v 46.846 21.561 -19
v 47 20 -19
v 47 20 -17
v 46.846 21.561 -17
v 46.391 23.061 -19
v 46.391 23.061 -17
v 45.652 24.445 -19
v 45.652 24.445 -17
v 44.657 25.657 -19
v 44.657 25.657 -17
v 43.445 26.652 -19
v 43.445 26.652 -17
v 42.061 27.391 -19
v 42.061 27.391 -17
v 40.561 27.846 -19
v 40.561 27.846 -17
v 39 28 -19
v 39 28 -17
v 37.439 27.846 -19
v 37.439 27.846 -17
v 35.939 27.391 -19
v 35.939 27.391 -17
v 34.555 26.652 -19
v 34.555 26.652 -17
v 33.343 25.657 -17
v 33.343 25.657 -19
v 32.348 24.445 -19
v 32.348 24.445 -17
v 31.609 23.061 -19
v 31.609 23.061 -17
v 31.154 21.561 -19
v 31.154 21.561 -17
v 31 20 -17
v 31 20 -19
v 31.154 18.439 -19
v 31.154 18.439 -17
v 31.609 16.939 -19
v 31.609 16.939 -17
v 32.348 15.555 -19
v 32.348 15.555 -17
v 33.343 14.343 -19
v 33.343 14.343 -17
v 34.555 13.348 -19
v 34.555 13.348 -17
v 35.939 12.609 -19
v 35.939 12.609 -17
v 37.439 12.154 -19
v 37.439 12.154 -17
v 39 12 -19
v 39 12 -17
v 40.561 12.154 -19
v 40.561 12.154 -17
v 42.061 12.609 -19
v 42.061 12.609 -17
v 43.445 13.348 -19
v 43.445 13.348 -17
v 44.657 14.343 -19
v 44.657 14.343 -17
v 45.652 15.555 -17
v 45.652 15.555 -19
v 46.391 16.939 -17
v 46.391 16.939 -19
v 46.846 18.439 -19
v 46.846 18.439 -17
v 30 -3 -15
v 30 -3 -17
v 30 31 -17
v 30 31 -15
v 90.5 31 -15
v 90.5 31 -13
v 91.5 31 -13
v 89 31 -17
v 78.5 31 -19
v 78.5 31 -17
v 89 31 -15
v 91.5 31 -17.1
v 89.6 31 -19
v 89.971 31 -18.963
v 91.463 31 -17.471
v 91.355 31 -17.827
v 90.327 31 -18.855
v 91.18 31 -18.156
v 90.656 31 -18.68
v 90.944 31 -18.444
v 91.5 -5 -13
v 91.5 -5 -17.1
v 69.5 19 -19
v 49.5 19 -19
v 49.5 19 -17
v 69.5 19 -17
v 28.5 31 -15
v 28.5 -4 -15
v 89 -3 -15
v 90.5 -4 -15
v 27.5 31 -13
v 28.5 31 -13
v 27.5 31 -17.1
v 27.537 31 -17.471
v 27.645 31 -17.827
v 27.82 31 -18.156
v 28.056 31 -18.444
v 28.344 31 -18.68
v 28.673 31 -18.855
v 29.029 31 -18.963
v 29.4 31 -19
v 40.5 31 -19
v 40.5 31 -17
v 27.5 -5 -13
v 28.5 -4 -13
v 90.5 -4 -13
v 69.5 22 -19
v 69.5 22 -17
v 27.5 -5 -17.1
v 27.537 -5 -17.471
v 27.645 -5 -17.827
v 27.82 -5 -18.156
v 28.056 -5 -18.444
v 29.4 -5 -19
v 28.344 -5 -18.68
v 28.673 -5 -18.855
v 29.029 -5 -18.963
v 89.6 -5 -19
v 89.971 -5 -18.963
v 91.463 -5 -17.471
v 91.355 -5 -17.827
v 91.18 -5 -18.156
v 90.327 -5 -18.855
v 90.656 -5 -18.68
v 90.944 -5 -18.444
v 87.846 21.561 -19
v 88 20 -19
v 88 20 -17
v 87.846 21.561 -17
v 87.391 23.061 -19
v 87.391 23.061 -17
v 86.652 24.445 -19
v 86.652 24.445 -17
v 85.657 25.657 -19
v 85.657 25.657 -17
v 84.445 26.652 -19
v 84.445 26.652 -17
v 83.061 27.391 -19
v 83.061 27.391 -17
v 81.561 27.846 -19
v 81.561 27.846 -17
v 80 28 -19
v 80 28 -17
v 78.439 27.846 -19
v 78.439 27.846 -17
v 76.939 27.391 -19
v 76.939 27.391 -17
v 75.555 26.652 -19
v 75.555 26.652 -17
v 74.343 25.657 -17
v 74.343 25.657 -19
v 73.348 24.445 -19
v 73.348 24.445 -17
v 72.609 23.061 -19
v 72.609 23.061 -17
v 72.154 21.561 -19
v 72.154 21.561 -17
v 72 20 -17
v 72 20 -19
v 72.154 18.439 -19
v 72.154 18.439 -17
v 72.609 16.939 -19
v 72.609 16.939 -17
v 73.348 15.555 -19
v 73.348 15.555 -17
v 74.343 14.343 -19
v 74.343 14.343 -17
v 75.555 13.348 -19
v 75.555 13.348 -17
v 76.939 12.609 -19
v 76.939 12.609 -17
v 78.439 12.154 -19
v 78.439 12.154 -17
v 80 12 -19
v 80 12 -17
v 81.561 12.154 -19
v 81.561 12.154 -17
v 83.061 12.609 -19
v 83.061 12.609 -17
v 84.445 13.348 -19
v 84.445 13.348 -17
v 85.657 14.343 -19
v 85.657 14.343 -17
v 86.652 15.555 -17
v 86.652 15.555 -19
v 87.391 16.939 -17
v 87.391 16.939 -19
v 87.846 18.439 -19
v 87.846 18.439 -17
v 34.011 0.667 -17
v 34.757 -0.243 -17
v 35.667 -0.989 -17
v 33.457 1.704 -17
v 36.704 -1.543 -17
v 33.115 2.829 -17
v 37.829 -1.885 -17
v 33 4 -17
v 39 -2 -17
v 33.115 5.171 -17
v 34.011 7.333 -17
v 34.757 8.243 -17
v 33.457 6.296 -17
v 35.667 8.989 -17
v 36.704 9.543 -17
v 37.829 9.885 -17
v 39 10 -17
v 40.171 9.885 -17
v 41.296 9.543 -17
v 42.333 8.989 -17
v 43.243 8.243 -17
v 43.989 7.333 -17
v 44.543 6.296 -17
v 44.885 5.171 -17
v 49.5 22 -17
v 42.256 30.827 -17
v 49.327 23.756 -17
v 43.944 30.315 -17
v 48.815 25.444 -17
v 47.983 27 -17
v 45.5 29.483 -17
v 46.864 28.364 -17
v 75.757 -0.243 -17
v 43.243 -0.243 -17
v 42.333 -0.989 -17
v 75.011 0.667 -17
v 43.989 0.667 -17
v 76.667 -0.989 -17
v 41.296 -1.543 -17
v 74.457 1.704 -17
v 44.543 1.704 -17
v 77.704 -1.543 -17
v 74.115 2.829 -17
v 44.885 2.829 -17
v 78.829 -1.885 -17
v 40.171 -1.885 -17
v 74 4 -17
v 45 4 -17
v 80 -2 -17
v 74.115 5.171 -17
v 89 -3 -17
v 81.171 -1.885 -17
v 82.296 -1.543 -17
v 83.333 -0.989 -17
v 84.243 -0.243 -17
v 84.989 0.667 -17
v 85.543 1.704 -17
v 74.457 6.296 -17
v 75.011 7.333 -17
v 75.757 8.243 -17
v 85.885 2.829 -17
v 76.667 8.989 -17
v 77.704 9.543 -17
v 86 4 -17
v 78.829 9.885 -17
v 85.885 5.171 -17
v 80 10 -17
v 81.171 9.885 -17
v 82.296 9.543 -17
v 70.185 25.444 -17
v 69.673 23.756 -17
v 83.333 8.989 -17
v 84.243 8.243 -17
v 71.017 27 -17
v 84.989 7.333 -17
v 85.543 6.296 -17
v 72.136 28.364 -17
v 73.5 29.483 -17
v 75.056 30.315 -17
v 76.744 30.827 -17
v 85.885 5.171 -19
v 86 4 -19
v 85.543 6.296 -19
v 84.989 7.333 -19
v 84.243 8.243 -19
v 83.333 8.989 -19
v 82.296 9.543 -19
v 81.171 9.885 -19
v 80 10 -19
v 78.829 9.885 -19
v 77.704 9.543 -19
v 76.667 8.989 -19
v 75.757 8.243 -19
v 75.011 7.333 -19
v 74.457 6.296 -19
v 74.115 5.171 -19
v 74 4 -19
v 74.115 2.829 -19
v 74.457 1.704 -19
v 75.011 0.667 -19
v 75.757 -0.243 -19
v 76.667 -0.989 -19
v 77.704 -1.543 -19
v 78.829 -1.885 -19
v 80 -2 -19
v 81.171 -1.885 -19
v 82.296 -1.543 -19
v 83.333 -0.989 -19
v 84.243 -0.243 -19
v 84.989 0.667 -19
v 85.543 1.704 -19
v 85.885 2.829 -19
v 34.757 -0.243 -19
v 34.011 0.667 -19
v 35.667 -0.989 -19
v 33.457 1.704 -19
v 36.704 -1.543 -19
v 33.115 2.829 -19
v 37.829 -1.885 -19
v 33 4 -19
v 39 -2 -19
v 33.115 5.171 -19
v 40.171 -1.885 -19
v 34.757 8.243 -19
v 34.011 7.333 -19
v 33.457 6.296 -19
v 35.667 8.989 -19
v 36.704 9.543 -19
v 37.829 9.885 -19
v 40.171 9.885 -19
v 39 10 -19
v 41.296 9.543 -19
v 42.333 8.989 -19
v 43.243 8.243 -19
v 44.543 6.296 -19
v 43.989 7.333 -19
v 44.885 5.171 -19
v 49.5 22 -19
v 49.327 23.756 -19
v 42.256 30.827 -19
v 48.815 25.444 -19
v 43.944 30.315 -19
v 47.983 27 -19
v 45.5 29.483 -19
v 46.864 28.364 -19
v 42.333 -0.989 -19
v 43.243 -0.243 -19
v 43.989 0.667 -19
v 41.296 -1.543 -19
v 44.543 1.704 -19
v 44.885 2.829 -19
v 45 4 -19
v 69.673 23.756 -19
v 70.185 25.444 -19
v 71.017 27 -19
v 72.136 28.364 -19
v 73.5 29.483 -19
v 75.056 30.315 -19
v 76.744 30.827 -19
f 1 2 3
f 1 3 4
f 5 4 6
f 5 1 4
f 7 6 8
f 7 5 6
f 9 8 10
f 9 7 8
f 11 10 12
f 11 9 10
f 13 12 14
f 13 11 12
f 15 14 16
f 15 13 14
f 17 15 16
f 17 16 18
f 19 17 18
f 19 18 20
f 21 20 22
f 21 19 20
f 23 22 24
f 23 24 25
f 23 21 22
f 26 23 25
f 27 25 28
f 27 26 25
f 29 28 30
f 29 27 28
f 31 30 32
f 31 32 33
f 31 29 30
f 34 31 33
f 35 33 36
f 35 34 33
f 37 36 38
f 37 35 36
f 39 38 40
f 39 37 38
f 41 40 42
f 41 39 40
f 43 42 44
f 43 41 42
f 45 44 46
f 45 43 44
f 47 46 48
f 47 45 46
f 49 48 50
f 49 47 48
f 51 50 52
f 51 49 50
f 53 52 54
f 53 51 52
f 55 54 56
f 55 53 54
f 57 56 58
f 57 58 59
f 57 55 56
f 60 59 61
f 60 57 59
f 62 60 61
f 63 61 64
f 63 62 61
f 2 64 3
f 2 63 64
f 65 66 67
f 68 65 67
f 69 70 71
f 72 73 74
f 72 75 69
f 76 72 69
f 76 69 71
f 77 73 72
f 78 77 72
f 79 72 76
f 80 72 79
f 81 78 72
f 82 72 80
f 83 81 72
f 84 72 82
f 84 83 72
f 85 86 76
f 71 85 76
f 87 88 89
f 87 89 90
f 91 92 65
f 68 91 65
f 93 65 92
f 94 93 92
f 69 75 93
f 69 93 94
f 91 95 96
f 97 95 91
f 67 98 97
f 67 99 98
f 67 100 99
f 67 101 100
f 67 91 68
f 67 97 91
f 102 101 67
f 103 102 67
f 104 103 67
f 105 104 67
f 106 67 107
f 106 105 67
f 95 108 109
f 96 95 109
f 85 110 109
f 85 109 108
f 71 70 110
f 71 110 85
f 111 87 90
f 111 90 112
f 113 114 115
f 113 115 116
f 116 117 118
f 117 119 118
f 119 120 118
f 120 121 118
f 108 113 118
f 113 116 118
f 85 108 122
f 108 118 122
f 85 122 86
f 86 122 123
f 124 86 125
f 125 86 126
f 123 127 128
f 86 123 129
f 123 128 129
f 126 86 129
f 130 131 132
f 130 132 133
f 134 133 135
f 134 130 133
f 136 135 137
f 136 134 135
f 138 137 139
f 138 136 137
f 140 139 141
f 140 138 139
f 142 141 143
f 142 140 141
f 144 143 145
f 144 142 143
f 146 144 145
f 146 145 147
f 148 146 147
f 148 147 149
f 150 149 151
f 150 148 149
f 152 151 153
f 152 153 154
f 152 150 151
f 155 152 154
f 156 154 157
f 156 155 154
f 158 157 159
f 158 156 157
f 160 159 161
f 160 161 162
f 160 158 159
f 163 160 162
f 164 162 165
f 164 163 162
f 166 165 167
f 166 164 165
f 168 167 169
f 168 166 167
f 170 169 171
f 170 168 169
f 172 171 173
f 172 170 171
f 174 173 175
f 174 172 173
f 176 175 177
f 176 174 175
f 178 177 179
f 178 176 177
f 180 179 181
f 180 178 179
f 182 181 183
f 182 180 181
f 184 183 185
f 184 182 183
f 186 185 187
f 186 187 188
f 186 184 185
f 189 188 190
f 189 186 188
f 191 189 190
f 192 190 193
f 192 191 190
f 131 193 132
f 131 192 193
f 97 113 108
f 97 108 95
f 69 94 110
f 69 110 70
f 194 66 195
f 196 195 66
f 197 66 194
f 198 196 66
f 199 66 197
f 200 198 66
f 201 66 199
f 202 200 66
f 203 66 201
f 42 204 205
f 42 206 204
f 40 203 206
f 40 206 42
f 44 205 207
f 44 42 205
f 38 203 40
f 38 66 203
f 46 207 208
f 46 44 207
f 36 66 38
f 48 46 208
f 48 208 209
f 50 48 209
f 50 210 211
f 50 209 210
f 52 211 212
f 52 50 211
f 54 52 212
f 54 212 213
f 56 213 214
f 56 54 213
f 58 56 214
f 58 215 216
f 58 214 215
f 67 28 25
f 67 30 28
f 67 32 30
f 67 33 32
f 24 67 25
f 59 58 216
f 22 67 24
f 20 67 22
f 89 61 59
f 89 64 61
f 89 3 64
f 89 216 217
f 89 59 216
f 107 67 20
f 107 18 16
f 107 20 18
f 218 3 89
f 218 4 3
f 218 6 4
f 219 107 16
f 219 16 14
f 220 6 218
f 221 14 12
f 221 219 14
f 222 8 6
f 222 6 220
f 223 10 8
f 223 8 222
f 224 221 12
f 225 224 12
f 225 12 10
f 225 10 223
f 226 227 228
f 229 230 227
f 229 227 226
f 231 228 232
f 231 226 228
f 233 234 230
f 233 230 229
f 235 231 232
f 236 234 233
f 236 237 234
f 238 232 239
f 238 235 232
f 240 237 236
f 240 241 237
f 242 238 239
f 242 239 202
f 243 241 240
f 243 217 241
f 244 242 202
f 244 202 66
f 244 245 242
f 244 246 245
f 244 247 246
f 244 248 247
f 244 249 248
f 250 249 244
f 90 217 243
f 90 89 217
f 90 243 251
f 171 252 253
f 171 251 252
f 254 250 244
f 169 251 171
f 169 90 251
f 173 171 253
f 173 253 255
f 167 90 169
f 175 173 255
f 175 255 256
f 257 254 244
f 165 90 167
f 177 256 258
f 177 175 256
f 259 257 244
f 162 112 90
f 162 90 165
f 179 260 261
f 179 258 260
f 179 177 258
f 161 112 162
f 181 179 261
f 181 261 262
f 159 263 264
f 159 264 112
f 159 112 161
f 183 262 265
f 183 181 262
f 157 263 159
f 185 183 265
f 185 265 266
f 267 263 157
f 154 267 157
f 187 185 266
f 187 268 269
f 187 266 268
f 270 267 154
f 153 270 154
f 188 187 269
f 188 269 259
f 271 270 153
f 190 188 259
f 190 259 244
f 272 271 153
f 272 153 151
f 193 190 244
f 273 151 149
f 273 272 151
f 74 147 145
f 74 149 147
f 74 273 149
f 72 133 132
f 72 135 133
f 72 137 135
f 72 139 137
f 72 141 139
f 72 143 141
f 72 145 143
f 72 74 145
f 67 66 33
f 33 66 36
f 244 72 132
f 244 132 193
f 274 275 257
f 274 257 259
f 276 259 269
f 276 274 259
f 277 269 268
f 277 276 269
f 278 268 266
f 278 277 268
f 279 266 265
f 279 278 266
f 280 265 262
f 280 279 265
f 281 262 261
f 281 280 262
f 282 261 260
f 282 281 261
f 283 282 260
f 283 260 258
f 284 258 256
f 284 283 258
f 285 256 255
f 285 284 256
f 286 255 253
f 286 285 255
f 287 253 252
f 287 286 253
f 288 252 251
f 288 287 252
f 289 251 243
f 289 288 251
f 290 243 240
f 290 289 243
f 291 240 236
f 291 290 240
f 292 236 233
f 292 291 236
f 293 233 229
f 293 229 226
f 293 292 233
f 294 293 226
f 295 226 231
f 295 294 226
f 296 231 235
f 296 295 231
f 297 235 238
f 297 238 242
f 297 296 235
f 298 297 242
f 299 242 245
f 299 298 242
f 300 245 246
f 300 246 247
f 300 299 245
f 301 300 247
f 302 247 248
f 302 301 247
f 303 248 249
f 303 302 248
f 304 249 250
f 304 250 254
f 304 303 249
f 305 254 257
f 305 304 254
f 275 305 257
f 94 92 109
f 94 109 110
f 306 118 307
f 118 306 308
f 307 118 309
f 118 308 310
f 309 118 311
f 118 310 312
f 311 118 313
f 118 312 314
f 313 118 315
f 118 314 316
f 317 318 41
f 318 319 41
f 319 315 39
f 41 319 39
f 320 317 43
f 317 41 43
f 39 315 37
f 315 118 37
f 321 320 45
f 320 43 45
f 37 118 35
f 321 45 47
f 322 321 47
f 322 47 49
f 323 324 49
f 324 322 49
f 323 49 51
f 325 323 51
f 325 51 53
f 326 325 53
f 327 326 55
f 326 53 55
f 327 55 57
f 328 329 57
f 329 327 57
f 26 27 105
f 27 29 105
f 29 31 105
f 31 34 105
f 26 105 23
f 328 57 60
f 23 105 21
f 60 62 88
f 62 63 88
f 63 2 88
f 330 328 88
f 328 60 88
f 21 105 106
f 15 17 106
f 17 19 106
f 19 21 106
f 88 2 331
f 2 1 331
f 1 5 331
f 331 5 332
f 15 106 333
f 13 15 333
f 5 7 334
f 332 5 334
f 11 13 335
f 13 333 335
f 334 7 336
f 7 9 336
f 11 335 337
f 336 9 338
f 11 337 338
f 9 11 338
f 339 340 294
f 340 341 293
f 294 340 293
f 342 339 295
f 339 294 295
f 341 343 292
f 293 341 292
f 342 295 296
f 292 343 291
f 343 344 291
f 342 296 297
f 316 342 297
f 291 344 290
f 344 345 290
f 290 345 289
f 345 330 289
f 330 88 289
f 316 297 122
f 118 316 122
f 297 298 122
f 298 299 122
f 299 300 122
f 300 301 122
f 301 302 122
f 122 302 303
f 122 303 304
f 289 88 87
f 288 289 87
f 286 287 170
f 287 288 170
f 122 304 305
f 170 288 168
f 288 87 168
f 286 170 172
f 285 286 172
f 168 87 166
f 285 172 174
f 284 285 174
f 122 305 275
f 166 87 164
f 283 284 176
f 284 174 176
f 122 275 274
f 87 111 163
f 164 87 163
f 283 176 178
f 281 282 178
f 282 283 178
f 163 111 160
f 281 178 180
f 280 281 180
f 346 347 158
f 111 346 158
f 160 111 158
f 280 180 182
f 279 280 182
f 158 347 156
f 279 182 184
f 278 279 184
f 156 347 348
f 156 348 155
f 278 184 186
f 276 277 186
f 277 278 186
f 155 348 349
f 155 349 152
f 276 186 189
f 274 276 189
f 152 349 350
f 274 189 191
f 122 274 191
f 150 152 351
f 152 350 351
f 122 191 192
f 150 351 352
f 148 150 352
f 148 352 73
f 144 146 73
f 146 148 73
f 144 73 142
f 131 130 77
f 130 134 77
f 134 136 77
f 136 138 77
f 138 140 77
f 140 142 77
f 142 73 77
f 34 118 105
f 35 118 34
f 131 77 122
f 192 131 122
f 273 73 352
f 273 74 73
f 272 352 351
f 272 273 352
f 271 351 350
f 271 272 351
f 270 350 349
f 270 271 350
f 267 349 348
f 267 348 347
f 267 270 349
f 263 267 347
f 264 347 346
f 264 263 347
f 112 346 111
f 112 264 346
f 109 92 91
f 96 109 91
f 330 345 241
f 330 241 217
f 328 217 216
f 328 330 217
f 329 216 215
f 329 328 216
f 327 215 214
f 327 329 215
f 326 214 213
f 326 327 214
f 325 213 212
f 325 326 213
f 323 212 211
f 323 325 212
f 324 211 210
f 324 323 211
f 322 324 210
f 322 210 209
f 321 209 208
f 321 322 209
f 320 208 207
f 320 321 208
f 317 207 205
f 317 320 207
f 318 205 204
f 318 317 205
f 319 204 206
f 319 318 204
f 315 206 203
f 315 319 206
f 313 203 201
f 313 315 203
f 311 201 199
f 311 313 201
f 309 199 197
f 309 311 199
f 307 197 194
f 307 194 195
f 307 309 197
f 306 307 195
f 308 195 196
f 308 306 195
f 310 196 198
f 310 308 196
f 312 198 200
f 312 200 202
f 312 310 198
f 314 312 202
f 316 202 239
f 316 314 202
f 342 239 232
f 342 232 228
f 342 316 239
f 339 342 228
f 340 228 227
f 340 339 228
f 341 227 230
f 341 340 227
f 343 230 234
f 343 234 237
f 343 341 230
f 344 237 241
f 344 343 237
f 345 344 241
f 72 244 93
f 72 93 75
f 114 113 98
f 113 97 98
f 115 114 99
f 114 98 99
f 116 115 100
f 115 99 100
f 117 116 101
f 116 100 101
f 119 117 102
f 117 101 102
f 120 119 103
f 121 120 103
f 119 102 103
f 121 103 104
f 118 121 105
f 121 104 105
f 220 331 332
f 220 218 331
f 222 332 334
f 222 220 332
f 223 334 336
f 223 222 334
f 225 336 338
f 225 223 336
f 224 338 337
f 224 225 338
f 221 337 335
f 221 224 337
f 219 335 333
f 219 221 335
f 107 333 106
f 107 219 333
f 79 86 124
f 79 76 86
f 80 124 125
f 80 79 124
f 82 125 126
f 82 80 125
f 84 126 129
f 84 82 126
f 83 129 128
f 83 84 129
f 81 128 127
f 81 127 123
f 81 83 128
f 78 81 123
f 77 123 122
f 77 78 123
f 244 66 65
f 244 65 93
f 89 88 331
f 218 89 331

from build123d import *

# Parameters (mm, degrees)
BOX123_W          = 1
BOX123_H          = 35
BOX123_DEPTH      = 2
BOX126_W          = 2.5
BOX126_H          = 36
BOX126_DEPTH      = 4
BOX128_W          = 64
BOX128_H          = 1
BOX128_DEPTH      = 2
BOX131_W          = 59
BOX131_H          = 2
BOX131_DEPTH      = 2
BOX125_W          = 1
BOX125_H          = 35
BOX125_DEPTH      = 2
CYLINDER055_R     = 8
CYLINDER055_DEPTH = 2
CYLINDER054_R     = 8
CYLINDER054_DEPTH = 2
CYLINDER057_R     = 6
CYLINDER057_DEPTH = 2
CYLINDER056_R     = 6
CYLINDER056_DEPTH = 2
BOX130_W          = 20
BOX130_H          = 12
BOX130_DEPTH      = 2
BOX129_W          = 59
BOX129_H          = 36
BOX129_DEPTH      = 2
BOX122_W          = 2.5
BOX122_H          = 36
BOX122_DEPTH      = 4
FILLET026_R       = 1.9
FILLET027_R       = 9


with BuildPart() as cube113:
    # Box123 → Box123 (new body)
    with BuildSketch(Plane(origin=(27.5, -4, -15), x_dir=(1, 0, 0), z_dir=(0, 0, 1))):
        with Locations((0.5, 17.5)):
            Rectangle(BOX123_W, BOX123_H)
    extrude(amount=BOX123_DEPTH)


with BuildPart() as cube116:
    # Box126 → Box126 (new body)
    with BuildSketch(Plane(origin=(89, -5, -19), x_dir=(1, 0, 0), z_dir=(0, 0, 1))):
        with Locations((1.25, 18)):
            Rectangle(BOX126_W, BOX126_H)
    extrude(amount=BOX126_DEPTH)


with BuildPart() as cube118:
    # Box128 → Box128 (new body)
    with BuildSketch(Plane(origin=(27.5, -5, -15), x_dir=(1, 0, 0), z_dir=(0, 0, 1))):
        with Locations((32, 0.5)):
            Rectangle(BOX128_W, BOX128_H)
    extrude(amount=BOX128_DEPTH)


with BuildPart() as cube121:
    # Box131 → Box131 (new body)
    with BuildSketch(Plane(origin=(30, -5, -17), x_dir=(1, 0, 0), z_dir=(0, 0, 1))):
        with Locations((29.5, 1)):
            Rectangle(BOX131_W, BOX131_H)
    extrude(amount=BOX131_DEPTH)


with BuildPart() as cube115:
    # Box125 → Box125 (new body)
    with BuildSketch(Plane(origin=(90.5, -4, -15), x_dir=(1, 0, 0), z_dir=(0, 0, 1))):
        with Locations((0.5, 17.5)):
            Rectangle(BOX125_W, BOX125_H)
    extrude(amount=BOX125_DEPTH)


with BuildPart() as cylinder136:
    # Cylinder055 → Cylinder055 (new body)
    with BuildSketch(Plane(origin=(80, 20, -19), x_dir=(1, 0, 0), z_dir=(0, 0, 1))):
        Circle(CYLINDER055_R)
    extrude(amount=CYLINDER055_DEPTH)


with BuildPart() as cylinder135:
    # Cylinder054 → Cylinder054 (new body)
    with BuildSketch(Plane(origin=(39, 20, -19), x_dir=(1, 0, 0), z_dir=(0, 0, 1))):
        Circle(CYLINDER054_R)
    extrude(amount=CYLINDER054_DEPTH)


with BuildPart() as cylinder138:
    # Cylinder057 → Cylinder057 (new body)
    with BuildSketch(Plane(origin=(39, 4, -19), x_dir=(1, 0, 0), z_dir=(0, 0, 1))):
        Circle(CYLINDER057_R)
    extrude(amount=CYLINDER057_DEPTH)


with BuildPart() as cylinder137:
    # Cylinder056 → Cylinder056 (new body)
    with BuildSketch(Plane(origin=(80, 4, -19), x_dir=(1, 0, 0), z_dir=(0, 0, 1))):
        Circle(CYLINDER056_R)
    extrude(amount=CYLINDER056_DEPTH)


with BuildPart() as cube120:
    # Box130 → Box130 (new body)
    with BuildSketch(Plane(origin=(49.5, 19, -19), x_dir=(1, 0, 0), z_dir=(0, 0, 1))):
        with Locations((10, 6)):
            Rectangle(BOX130_W, BOX130_H)
    extrude(amount=BOX130_DEPTH)


with BuildPart() as cut081:
    # Box129 → Box129 (new body)
    with BuildSketch(Plane(origin=(30, -5, -19), x_dir=(1, 0, 0), z_dir=(0, 0, 1))):
        with Locations((29.5, 18)):
            Rectangle(BOX129_W, BOX129_H)
    extrude(amount=BOX129_DEPTH)

    # Cut077: cut Cube120
    add(cube120.part, mode=Mode.SUBTRACT)

    # Cut078: cut Cylinder137
    add(cylinder137.part, mode=Mode.SUBTRACT)

    # Cut079: cut Cylinder138
    add(cylinder138.part, mode=Mode.SUBTRACT)

    # Cut080: cut Cylinder135
    add(cylinder135.part, mode=Mode.SUBTRACT)

    # Cut081: cut Cylinder136
    add(cylinder136.part, mode=Mode.SUBTRACT)


with BuildPart() as fillet027:
    # Box122 → Box122 (new body)
    with BuildSketch(Plane(origin=(27.5, -5, -19), x_dir=(1, 0, 0), z_dir=(0, 0, 1))):
        with Locations((1.25, 18)):
            Rectangle(BOX122_W, BOX122_H)
    extrude(amount=BOX122_DEPTH)

    # Fusion045: union Cube113, Cube116, Cube118, Cube121, Cube115, Cut081
    add(cube113.part)
    add(cube116.part)
    add(cube118.part)
    add(cube121.part)
    add(cube115.part)
    add(cut081.part)

    # Fillet026
    fillet026_edges = [fillet027.edges().sort_by_distance(p)[0] for p in [
        (27.5, 13, -19),
        (91.5, 13, -19),
    ]]
    fillet(fillet026_edges, radius=FILLET026_R)

    # Fillet027
    fillet027_edges = [fillet027.edges().sort_by_distance(p)[0] for p in [
        (49.5, 31, -18),
        (69.5, 31, -18),
    ]]
    fillet(fillet027_edges, radius=FILLET027_R)


solid = fillet027.part
